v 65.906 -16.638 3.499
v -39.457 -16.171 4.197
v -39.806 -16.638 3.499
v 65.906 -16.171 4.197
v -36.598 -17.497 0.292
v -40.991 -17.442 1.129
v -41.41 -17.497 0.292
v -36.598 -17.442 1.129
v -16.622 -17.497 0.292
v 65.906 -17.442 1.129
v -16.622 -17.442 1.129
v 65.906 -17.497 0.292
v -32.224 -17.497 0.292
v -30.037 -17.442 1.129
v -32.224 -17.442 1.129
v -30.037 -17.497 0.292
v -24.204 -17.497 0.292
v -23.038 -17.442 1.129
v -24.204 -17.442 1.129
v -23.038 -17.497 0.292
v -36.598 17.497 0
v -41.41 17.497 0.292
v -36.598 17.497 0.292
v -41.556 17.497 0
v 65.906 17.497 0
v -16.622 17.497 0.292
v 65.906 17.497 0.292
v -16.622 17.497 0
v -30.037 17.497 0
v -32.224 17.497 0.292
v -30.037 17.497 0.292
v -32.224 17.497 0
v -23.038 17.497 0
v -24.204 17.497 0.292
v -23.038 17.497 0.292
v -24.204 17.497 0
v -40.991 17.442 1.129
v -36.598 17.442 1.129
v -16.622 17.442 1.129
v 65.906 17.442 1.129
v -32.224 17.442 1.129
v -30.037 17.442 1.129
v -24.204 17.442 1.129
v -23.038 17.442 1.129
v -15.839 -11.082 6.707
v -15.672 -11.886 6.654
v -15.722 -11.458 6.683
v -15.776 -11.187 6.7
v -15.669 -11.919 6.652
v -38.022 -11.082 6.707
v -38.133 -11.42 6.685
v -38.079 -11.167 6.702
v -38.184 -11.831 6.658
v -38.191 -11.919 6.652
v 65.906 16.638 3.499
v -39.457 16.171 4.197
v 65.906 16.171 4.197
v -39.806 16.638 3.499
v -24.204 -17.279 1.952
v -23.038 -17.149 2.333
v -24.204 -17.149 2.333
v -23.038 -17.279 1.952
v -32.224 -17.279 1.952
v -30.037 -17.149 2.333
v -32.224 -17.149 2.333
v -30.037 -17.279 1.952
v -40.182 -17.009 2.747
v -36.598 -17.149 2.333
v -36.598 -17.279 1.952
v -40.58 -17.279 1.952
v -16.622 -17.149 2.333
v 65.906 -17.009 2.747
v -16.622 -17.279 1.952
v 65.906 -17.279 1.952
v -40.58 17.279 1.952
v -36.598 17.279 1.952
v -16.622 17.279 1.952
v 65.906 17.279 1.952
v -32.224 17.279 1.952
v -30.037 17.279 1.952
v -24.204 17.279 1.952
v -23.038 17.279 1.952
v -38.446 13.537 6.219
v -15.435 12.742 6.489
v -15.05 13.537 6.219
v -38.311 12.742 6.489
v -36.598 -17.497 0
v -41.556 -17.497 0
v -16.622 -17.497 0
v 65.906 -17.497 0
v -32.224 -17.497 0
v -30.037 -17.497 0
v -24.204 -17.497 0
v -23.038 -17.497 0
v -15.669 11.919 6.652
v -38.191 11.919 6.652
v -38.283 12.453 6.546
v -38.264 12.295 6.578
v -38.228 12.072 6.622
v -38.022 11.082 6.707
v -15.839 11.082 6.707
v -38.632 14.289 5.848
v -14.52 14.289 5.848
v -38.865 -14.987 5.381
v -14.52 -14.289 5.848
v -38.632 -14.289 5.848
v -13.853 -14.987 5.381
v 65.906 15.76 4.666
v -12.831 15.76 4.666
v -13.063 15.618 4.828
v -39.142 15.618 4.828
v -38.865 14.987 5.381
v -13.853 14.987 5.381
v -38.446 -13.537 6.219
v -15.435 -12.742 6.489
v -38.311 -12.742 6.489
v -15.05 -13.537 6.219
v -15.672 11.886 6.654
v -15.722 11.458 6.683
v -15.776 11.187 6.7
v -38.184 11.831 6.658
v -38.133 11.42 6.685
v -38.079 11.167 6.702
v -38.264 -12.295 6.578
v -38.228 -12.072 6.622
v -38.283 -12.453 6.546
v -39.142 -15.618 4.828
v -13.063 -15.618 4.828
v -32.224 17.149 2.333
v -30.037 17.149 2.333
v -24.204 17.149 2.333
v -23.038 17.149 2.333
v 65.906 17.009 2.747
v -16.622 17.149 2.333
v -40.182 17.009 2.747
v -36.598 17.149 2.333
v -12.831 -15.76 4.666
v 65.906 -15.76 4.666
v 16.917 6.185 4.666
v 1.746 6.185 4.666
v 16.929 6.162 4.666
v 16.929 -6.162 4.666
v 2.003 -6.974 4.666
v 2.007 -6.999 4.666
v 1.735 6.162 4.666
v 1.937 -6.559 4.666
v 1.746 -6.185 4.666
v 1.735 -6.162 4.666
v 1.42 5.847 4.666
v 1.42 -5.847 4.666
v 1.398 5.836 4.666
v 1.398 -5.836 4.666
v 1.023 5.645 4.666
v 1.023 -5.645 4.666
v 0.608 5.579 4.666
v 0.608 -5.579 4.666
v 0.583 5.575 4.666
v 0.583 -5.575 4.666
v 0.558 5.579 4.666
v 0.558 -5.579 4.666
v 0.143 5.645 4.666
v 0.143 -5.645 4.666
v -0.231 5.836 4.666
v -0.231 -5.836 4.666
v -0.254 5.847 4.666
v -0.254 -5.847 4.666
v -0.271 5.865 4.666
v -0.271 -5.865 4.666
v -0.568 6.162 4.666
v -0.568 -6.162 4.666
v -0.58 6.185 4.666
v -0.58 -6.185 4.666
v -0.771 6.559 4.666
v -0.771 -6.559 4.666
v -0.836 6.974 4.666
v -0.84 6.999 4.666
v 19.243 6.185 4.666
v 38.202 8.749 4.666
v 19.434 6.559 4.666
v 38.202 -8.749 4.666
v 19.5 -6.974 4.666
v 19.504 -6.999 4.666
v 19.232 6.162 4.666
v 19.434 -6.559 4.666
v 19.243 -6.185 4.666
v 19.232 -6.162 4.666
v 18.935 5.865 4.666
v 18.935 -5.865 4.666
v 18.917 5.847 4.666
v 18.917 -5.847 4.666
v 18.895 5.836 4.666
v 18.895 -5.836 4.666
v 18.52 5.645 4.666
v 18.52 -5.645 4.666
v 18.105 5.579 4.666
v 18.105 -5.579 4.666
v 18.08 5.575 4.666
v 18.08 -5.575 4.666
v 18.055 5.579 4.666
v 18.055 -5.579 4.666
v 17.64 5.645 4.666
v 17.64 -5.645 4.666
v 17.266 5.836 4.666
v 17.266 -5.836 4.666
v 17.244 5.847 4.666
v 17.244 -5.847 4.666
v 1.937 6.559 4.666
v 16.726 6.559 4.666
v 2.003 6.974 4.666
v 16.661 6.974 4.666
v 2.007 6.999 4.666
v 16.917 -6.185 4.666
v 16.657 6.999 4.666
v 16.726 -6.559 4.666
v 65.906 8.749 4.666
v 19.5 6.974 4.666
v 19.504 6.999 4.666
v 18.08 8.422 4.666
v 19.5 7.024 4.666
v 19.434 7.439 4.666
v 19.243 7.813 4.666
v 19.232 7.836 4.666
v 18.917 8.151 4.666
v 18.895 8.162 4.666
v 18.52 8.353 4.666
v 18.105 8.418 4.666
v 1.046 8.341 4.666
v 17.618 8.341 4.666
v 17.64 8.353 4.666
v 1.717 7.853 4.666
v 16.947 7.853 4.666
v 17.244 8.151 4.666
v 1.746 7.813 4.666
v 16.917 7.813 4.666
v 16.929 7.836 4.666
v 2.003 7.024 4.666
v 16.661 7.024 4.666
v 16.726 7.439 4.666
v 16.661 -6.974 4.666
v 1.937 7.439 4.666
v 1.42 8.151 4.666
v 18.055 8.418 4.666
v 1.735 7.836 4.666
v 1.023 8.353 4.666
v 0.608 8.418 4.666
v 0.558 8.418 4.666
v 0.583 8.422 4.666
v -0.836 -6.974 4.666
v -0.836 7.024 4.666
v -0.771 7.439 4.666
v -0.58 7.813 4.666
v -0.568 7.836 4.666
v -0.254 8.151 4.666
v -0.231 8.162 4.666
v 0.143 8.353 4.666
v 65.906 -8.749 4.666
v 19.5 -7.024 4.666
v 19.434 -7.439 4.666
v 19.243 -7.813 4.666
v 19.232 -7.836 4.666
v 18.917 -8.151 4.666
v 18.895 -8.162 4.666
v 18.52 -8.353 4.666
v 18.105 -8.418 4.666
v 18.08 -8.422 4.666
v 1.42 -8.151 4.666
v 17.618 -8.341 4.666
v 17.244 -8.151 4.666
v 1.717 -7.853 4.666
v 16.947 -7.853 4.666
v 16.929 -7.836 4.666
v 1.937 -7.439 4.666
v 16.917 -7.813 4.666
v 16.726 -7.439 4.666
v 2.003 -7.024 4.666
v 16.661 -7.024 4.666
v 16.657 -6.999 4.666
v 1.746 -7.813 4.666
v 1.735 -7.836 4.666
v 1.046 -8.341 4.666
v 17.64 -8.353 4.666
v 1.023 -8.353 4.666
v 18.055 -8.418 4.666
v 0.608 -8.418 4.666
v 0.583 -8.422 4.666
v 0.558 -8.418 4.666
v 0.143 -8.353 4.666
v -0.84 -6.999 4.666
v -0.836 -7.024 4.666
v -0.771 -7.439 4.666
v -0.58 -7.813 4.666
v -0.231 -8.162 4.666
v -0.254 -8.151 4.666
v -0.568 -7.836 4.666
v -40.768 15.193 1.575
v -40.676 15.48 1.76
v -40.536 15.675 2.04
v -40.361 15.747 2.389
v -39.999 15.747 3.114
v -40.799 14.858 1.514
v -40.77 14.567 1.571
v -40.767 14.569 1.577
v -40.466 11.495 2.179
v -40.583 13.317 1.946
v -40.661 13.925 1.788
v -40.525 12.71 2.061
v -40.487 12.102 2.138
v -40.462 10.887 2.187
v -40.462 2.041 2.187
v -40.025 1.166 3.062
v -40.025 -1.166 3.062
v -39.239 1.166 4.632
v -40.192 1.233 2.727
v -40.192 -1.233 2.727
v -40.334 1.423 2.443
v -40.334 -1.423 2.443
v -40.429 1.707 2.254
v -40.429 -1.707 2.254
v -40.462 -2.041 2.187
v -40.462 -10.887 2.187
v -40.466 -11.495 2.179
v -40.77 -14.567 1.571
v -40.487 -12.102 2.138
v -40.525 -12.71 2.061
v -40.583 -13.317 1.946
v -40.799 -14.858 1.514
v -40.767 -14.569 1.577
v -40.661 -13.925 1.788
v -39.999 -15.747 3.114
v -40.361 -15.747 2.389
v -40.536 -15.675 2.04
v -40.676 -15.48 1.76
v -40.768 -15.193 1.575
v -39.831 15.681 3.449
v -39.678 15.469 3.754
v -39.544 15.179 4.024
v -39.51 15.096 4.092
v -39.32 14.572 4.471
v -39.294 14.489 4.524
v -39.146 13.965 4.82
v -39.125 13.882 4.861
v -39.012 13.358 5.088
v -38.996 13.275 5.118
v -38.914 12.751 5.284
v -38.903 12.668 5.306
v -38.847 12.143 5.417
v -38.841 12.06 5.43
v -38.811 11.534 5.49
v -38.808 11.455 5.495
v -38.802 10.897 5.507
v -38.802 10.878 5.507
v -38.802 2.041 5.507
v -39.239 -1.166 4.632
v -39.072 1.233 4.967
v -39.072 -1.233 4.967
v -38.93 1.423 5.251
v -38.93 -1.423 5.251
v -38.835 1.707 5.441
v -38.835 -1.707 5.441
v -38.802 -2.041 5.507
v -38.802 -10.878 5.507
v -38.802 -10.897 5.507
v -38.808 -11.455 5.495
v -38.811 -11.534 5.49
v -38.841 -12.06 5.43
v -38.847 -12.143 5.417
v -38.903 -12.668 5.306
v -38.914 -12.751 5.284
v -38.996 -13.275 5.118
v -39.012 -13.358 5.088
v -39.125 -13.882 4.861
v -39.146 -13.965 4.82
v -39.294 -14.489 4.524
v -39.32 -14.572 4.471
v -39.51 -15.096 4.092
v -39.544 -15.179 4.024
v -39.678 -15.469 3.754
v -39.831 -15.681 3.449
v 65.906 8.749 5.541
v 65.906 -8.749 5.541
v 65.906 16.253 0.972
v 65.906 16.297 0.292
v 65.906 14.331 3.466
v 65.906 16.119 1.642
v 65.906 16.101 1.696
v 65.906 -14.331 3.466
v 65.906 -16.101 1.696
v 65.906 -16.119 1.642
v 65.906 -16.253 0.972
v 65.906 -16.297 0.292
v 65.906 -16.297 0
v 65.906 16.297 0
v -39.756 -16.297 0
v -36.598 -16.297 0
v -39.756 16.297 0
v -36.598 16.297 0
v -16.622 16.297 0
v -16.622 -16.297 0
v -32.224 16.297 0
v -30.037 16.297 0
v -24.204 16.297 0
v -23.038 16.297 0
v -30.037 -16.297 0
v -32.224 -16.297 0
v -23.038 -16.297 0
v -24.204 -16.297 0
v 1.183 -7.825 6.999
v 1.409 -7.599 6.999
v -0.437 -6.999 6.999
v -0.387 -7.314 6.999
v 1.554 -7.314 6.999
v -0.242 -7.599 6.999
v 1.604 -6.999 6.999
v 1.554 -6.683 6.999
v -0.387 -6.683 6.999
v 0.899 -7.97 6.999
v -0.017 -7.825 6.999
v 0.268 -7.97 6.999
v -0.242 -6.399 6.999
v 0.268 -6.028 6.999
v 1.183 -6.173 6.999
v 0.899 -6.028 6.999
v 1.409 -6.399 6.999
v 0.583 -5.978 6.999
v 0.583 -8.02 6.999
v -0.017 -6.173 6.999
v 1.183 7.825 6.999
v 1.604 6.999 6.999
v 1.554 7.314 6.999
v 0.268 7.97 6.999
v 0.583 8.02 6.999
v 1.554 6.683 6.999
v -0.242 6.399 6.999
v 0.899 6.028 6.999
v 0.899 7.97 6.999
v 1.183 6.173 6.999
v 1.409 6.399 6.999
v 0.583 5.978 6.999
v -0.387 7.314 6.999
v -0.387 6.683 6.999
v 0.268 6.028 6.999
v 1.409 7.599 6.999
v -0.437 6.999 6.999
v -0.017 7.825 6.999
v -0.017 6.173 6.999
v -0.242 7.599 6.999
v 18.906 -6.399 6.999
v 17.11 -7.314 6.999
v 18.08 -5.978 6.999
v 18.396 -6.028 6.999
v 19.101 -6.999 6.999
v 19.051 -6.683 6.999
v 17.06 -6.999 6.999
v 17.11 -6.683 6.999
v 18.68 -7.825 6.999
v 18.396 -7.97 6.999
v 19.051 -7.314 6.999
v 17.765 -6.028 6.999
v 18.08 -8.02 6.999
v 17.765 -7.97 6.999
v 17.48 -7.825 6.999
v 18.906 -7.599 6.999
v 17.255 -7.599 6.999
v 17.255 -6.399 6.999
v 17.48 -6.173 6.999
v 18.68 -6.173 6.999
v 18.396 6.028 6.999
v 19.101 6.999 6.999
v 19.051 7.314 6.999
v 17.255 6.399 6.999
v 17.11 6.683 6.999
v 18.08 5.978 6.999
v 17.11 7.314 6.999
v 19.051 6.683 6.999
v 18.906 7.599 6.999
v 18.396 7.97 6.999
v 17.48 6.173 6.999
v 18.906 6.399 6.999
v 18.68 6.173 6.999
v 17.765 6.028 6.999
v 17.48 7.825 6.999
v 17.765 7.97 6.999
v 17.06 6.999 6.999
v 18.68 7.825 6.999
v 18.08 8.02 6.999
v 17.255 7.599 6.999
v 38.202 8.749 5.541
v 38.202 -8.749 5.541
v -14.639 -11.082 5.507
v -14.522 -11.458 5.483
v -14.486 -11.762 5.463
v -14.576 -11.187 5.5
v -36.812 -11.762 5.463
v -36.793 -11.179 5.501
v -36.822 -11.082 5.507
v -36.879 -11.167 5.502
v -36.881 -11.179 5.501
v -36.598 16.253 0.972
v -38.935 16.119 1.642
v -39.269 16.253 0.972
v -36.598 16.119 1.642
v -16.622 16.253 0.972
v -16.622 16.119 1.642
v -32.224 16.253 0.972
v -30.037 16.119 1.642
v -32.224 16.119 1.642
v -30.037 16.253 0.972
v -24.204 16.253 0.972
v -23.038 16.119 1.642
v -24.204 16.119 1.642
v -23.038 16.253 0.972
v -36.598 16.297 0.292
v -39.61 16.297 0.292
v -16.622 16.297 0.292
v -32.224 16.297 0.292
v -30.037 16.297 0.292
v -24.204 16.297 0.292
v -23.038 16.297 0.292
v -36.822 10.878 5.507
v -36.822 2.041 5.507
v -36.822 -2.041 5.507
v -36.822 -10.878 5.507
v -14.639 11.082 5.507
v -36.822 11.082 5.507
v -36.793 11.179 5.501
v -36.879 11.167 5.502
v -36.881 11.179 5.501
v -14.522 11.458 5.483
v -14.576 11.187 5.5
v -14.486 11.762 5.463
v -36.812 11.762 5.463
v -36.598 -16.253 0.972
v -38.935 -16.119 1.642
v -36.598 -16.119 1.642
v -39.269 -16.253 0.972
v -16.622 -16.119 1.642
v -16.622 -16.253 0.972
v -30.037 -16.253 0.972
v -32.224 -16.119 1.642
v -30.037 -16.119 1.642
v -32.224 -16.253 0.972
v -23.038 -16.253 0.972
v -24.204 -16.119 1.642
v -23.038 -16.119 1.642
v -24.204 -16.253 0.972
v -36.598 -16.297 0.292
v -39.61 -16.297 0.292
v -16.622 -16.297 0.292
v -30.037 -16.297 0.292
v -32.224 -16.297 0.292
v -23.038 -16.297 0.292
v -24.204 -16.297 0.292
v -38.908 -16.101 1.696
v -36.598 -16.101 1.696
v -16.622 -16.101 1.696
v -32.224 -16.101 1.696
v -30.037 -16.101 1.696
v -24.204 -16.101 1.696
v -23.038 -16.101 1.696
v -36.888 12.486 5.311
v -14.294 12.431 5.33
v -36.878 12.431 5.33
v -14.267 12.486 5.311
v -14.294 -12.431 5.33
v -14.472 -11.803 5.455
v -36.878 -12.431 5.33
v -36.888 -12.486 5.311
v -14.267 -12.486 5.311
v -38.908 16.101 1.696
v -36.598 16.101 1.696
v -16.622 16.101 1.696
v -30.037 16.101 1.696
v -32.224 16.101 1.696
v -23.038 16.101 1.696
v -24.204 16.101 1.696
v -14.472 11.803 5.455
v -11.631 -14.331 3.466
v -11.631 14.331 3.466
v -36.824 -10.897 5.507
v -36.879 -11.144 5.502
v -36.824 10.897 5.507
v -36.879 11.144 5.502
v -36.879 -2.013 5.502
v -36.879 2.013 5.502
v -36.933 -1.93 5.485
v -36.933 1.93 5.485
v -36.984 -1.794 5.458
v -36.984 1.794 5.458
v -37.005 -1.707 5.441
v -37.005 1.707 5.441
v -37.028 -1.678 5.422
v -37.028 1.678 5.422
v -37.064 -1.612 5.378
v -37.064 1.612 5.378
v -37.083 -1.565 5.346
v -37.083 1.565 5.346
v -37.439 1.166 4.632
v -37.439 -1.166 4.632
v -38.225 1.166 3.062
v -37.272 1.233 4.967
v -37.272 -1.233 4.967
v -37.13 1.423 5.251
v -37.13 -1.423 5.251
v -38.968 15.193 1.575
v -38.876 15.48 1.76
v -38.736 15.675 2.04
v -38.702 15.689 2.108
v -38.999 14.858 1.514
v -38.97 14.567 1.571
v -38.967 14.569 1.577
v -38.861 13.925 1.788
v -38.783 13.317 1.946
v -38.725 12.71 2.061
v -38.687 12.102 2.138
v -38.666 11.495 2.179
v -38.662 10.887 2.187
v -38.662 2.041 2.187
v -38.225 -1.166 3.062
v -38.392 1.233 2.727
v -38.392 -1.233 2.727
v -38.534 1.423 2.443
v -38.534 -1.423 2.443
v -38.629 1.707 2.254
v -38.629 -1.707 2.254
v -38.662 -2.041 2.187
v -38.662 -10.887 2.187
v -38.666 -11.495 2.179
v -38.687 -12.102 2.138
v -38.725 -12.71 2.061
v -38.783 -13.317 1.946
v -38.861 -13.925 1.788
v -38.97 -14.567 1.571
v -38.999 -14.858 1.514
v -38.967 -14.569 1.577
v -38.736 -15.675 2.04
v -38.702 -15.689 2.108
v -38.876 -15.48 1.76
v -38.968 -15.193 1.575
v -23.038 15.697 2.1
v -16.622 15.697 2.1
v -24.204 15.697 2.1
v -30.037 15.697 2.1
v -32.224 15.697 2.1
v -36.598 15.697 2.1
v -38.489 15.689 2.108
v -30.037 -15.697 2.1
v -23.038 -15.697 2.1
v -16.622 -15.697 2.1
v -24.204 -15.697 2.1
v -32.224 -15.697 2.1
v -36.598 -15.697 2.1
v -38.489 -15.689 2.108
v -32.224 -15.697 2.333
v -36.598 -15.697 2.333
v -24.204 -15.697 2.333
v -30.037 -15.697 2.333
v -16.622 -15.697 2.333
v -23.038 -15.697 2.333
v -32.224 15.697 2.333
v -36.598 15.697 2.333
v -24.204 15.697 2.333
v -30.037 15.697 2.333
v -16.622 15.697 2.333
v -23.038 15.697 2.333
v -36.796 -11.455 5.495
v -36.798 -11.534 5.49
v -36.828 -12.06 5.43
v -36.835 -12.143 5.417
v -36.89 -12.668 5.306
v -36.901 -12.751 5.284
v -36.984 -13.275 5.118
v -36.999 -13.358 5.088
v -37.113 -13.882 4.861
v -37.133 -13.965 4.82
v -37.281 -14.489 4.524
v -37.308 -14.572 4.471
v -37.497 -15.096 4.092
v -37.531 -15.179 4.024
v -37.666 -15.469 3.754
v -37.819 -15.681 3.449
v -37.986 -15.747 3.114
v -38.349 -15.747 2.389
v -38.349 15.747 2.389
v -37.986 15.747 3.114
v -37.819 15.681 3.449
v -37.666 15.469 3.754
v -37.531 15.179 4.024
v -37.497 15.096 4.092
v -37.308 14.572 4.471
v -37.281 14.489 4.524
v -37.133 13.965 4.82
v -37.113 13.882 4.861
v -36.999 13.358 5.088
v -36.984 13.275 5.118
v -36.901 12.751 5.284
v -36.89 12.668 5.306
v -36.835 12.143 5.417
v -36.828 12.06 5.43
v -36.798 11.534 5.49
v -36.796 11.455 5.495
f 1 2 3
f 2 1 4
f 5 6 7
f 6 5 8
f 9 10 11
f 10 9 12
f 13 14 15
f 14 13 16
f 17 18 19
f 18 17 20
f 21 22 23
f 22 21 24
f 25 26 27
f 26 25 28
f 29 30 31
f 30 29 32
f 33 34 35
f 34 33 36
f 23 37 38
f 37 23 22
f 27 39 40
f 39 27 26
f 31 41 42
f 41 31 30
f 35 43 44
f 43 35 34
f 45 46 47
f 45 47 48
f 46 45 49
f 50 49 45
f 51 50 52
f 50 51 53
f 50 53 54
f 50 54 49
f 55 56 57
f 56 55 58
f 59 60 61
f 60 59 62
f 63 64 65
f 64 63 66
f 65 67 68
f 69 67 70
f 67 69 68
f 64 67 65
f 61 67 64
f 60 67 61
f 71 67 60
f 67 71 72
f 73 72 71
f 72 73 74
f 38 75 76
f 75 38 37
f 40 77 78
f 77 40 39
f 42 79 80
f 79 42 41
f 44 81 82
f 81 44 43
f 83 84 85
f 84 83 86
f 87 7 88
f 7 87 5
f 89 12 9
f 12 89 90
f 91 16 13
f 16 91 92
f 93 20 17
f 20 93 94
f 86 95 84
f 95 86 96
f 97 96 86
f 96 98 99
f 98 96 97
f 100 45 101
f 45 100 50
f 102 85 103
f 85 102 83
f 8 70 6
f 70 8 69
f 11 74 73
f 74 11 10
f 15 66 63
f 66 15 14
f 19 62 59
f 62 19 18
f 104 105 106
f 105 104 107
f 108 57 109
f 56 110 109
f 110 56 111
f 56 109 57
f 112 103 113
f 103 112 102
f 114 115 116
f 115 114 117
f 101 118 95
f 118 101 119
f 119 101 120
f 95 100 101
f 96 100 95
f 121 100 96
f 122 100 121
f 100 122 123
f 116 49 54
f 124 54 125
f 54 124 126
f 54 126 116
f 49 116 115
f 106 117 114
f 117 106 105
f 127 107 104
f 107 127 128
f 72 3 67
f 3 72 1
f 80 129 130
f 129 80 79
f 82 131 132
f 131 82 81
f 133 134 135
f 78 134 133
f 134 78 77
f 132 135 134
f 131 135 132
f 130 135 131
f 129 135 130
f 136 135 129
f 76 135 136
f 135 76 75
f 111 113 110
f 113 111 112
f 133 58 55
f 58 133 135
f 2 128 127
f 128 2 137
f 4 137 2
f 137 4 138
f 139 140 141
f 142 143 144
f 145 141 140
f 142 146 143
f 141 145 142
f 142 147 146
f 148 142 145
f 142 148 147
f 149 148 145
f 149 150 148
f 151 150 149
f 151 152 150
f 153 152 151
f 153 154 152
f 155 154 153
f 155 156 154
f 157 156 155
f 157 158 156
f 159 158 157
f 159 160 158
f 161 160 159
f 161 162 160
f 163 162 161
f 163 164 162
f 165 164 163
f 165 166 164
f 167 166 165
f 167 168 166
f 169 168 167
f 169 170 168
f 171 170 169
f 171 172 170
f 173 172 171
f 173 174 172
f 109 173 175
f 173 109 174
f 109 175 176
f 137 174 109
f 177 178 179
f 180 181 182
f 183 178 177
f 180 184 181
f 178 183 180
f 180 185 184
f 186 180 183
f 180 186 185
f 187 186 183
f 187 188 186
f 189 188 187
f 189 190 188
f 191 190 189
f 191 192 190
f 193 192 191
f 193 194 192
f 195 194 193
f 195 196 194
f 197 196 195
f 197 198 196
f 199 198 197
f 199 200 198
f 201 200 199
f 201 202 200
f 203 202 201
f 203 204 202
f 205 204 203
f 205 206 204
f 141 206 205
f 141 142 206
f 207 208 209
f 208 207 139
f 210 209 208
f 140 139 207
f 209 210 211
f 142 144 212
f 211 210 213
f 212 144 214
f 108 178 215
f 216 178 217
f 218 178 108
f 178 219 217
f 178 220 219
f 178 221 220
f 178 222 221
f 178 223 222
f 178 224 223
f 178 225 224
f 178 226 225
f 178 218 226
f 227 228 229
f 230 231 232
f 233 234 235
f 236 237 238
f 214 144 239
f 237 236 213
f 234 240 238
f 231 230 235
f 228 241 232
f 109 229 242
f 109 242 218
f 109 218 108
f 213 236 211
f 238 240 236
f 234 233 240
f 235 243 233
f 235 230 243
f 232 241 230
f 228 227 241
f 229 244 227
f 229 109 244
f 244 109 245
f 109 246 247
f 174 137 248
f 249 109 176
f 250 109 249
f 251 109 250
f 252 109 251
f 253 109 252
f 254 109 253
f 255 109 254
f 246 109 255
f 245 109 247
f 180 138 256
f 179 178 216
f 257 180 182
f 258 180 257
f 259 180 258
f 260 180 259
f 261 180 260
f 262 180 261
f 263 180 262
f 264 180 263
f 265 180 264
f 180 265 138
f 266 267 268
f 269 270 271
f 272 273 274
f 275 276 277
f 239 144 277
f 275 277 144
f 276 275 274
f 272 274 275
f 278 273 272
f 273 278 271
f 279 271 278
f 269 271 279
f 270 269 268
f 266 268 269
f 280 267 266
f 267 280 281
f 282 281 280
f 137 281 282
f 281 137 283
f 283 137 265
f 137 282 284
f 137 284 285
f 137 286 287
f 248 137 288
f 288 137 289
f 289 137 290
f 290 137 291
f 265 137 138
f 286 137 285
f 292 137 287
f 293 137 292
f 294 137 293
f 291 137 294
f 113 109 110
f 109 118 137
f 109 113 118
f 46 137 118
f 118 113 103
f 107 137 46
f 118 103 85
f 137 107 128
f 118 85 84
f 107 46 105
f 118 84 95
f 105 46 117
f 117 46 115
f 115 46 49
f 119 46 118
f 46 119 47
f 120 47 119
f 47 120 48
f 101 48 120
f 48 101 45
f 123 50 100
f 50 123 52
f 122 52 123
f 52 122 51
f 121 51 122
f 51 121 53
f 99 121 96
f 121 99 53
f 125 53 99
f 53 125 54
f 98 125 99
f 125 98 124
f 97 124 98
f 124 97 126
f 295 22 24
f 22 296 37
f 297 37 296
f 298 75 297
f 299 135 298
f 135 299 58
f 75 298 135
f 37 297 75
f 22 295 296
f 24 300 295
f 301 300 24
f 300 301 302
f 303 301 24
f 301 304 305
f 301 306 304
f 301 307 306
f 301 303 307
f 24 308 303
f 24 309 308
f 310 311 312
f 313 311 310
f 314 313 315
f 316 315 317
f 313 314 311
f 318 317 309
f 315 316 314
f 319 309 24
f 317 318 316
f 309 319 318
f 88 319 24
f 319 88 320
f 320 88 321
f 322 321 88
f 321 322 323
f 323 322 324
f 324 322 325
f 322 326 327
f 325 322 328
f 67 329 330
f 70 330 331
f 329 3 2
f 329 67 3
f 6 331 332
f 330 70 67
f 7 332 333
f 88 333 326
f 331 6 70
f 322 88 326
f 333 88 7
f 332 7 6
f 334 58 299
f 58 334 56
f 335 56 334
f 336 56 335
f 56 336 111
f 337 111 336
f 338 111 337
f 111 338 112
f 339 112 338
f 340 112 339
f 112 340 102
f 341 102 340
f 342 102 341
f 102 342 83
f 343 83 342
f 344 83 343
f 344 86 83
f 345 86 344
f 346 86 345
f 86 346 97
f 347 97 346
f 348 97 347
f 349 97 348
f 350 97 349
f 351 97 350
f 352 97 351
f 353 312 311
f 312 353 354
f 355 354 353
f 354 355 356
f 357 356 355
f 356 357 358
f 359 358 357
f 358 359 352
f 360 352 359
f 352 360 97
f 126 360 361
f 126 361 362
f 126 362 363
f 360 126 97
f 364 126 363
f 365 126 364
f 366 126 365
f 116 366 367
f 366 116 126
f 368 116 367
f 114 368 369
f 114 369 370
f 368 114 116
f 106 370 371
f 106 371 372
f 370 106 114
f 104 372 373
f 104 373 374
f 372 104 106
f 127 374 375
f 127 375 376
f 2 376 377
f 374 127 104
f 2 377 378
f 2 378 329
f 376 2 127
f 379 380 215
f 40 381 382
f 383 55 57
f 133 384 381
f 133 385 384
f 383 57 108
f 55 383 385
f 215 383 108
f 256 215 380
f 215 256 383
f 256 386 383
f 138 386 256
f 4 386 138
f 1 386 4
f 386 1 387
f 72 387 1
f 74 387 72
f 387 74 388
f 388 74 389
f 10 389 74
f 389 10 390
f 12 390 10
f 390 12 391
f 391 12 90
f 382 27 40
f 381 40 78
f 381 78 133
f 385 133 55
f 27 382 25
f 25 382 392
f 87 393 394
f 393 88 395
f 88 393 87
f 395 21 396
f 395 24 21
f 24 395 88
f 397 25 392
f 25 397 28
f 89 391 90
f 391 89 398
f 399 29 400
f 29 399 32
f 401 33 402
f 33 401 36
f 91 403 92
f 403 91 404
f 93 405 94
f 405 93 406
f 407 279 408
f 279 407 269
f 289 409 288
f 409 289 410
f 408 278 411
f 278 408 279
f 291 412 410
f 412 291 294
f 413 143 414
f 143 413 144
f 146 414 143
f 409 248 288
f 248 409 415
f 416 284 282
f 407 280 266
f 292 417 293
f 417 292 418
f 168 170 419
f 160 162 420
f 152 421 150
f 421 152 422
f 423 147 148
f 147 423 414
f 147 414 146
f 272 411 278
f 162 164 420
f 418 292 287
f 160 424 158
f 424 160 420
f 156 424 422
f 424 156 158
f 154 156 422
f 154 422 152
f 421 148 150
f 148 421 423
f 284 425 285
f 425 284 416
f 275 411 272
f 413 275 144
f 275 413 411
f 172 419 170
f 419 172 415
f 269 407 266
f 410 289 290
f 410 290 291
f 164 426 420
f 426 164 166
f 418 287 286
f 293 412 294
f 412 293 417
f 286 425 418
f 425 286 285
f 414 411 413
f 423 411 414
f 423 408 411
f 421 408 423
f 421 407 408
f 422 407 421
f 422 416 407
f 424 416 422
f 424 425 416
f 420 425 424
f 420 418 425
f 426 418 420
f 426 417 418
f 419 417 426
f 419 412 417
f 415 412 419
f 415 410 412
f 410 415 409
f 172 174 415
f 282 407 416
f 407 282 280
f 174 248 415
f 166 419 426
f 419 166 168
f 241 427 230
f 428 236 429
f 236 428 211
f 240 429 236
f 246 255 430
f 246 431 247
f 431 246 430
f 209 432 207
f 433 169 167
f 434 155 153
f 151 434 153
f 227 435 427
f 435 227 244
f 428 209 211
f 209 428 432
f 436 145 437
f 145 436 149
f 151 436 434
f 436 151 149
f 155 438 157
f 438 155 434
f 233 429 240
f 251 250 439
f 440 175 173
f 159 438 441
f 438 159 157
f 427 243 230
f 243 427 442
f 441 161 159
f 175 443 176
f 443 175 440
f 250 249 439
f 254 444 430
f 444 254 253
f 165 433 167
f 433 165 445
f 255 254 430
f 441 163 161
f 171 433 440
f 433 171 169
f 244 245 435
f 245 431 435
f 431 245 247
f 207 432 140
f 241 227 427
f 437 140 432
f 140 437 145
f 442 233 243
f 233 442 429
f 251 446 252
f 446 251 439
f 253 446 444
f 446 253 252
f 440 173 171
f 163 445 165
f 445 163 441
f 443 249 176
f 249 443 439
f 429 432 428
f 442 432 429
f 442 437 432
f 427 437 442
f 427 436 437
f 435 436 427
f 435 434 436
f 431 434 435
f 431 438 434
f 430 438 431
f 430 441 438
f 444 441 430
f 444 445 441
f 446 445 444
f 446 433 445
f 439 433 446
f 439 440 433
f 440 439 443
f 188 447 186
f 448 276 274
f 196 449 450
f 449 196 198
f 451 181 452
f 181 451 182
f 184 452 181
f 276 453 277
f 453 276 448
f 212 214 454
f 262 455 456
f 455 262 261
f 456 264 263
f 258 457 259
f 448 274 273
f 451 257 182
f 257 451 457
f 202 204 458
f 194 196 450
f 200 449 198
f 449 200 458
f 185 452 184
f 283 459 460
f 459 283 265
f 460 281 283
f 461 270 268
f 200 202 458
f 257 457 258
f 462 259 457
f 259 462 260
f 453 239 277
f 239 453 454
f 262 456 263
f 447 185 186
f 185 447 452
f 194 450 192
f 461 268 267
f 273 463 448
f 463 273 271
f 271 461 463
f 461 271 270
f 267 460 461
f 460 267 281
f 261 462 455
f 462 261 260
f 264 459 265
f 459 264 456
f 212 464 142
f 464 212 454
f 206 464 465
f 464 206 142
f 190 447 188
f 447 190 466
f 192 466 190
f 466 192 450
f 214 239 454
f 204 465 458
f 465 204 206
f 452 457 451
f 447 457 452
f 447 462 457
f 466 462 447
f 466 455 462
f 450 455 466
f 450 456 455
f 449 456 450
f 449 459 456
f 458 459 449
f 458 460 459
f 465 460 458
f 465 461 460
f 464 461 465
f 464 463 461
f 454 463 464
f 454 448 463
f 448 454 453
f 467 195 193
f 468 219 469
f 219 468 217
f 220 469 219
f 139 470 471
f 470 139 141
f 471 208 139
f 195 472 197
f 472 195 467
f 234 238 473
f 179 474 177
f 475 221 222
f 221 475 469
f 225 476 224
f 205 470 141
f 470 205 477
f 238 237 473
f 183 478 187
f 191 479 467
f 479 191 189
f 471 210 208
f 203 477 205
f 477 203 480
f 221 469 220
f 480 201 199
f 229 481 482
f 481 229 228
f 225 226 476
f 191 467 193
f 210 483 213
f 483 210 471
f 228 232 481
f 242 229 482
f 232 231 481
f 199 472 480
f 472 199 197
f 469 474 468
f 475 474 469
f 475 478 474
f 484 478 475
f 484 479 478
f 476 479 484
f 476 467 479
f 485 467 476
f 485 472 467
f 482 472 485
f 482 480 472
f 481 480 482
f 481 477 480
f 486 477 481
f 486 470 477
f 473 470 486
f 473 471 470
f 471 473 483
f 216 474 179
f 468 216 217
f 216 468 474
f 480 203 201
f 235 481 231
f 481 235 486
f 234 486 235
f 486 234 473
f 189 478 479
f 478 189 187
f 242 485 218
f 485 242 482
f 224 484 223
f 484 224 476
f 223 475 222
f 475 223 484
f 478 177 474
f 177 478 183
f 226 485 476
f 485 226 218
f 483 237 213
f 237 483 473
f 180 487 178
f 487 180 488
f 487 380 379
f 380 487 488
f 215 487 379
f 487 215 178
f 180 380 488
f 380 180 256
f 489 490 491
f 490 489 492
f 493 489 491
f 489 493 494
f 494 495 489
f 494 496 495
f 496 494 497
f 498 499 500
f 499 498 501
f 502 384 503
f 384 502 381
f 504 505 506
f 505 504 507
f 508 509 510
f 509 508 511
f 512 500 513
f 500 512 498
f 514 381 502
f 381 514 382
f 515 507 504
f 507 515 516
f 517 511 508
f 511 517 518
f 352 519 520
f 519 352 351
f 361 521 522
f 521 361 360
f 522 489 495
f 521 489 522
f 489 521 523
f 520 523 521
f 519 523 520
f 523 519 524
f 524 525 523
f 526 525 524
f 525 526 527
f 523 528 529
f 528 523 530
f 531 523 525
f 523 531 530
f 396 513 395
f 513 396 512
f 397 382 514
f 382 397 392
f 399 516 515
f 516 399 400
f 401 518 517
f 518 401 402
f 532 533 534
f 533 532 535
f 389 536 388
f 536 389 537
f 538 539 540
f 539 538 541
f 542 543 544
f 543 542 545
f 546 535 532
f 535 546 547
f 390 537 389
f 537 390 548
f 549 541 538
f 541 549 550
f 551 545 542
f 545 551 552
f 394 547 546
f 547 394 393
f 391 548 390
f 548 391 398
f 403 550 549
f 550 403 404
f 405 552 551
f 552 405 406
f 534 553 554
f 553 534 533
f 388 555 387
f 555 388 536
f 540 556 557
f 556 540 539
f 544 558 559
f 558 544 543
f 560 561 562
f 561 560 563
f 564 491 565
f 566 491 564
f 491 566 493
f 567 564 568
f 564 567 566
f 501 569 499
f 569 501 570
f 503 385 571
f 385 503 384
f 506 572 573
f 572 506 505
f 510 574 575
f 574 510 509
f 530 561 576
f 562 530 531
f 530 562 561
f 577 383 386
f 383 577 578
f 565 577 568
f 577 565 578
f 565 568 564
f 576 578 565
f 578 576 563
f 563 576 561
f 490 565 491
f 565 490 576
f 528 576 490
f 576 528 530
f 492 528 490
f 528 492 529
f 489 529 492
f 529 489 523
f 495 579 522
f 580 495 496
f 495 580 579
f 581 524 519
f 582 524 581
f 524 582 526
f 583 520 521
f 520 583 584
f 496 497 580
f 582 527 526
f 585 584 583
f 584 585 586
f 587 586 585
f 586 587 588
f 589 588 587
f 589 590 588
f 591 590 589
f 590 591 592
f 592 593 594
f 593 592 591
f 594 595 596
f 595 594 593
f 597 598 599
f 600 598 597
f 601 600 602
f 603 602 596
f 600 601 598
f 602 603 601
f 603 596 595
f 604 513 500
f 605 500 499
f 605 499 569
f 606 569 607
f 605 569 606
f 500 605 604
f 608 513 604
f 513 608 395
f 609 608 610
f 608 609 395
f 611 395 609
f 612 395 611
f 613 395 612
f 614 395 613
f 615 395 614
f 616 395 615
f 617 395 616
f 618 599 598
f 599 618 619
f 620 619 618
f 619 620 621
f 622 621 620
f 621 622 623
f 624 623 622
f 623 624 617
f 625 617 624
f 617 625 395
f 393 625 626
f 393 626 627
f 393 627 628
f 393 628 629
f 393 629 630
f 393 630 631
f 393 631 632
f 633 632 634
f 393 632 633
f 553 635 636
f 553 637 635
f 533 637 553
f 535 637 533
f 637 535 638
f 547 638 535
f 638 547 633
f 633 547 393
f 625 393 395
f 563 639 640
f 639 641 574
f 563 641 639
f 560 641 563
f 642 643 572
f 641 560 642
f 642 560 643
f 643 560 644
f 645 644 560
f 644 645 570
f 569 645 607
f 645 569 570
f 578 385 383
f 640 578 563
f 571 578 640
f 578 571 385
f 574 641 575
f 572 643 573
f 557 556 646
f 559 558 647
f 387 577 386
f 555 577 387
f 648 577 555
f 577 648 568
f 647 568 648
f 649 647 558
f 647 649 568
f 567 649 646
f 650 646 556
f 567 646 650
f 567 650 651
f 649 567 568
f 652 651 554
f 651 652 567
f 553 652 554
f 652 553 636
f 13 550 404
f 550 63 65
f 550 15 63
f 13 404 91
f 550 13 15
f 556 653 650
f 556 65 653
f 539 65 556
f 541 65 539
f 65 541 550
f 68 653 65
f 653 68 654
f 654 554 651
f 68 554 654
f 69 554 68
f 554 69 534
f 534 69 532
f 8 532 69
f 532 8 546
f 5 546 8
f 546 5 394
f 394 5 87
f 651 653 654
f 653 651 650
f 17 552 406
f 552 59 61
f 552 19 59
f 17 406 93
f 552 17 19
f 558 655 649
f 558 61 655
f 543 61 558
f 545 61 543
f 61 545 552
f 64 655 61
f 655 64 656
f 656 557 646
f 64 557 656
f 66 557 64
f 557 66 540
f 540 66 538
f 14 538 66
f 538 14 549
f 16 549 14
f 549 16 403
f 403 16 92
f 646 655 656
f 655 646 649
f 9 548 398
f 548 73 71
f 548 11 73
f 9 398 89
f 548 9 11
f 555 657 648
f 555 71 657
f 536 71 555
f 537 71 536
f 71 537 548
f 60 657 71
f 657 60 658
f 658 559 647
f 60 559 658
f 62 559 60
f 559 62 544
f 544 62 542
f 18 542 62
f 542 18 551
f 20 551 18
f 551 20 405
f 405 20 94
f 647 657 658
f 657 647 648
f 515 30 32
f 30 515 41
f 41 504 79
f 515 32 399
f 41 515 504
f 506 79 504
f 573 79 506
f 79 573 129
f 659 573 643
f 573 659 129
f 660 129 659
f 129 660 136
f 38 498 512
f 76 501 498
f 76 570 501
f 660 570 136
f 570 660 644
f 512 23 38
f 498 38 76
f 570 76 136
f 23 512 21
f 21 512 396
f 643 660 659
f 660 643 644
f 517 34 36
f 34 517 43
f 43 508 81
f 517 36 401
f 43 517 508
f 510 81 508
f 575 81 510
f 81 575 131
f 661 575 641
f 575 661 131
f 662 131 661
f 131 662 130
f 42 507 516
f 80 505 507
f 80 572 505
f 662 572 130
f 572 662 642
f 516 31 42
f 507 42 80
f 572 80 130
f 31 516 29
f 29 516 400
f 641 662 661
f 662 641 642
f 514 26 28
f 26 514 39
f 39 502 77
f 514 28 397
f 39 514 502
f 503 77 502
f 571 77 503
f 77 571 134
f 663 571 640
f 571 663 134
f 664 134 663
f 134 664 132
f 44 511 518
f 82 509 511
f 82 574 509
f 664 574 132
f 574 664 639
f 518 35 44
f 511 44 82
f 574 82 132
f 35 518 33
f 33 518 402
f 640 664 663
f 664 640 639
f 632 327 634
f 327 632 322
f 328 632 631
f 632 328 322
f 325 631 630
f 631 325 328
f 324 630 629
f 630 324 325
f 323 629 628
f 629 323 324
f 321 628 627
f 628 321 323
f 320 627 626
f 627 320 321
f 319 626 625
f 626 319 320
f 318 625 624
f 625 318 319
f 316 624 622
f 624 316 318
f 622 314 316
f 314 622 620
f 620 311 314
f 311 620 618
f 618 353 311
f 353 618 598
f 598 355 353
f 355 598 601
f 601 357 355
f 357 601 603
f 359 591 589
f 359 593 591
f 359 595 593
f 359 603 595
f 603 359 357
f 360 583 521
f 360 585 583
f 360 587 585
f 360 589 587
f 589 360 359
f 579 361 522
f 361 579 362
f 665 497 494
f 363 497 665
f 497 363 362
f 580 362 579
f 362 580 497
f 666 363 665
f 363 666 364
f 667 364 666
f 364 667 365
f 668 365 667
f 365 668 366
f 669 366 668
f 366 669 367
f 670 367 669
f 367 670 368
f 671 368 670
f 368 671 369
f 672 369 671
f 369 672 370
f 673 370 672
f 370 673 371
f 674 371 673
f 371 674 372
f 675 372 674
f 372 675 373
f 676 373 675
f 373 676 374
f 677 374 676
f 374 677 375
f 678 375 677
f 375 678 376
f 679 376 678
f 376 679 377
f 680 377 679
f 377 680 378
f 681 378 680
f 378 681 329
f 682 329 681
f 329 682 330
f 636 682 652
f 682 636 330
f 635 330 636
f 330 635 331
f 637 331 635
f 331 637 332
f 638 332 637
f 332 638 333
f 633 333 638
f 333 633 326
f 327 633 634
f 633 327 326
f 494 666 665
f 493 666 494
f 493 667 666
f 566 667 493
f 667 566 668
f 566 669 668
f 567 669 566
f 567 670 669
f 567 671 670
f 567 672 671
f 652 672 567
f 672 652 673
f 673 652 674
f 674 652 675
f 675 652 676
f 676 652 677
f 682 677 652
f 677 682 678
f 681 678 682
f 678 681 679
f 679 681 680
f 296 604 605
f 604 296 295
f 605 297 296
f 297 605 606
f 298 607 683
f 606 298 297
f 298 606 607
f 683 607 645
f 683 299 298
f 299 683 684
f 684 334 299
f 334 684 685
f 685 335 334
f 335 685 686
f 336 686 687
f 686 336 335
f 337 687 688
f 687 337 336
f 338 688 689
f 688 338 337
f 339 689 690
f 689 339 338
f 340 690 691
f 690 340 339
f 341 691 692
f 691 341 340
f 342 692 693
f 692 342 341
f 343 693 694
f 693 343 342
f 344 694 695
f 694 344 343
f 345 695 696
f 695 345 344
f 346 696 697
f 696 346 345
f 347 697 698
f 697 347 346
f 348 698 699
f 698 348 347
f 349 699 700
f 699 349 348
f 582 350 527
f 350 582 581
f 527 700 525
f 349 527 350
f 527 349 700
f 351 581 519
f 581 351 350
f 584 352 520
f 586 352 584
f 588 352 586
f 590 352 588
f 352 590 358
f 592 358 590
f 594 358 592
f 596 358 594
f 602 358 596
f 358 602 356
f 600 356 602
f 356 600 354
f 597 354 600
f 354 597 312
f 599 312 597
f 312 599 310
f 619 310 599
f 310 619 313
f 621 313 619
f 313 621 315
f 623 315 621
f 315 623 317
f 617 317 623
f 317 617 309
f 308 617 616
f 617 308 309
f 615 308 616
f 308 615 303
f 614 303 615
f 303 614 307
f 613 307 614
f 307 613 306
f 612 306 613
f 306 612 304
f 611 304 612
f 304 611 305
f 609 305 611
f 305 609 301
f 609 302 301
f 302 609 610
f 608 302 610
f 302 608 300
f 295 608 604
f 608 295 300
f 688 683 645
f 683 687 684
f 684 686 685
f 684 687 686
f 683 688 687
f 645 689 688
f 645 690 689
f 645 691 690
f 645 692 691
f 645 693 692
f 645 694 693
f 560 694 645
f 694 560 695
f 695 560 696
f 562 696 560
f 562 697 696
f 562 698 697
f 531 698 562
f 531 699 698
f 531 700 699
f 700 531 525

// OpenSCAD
// Milwaukee Road Little Joe, HO scale 1-87 - print 3 of 11: roof_1 - roof, section 1 (print upright)
// Render (F6), export STL, print. Settings: ../../library/lj_params.scad
// Whole loco preview and notes: ../../MILW_LittleJoe_Main.scad
SCALE_SEL = "HO";
LOCO_SEL = "E70";   // [E20, E21, E70, E71, E72, E73, E74, E75, E76, E77, E78, E79] the body and roof change for E20 / E21
include <../../library/lj_all.scad>
lj_plate("roof_1");
